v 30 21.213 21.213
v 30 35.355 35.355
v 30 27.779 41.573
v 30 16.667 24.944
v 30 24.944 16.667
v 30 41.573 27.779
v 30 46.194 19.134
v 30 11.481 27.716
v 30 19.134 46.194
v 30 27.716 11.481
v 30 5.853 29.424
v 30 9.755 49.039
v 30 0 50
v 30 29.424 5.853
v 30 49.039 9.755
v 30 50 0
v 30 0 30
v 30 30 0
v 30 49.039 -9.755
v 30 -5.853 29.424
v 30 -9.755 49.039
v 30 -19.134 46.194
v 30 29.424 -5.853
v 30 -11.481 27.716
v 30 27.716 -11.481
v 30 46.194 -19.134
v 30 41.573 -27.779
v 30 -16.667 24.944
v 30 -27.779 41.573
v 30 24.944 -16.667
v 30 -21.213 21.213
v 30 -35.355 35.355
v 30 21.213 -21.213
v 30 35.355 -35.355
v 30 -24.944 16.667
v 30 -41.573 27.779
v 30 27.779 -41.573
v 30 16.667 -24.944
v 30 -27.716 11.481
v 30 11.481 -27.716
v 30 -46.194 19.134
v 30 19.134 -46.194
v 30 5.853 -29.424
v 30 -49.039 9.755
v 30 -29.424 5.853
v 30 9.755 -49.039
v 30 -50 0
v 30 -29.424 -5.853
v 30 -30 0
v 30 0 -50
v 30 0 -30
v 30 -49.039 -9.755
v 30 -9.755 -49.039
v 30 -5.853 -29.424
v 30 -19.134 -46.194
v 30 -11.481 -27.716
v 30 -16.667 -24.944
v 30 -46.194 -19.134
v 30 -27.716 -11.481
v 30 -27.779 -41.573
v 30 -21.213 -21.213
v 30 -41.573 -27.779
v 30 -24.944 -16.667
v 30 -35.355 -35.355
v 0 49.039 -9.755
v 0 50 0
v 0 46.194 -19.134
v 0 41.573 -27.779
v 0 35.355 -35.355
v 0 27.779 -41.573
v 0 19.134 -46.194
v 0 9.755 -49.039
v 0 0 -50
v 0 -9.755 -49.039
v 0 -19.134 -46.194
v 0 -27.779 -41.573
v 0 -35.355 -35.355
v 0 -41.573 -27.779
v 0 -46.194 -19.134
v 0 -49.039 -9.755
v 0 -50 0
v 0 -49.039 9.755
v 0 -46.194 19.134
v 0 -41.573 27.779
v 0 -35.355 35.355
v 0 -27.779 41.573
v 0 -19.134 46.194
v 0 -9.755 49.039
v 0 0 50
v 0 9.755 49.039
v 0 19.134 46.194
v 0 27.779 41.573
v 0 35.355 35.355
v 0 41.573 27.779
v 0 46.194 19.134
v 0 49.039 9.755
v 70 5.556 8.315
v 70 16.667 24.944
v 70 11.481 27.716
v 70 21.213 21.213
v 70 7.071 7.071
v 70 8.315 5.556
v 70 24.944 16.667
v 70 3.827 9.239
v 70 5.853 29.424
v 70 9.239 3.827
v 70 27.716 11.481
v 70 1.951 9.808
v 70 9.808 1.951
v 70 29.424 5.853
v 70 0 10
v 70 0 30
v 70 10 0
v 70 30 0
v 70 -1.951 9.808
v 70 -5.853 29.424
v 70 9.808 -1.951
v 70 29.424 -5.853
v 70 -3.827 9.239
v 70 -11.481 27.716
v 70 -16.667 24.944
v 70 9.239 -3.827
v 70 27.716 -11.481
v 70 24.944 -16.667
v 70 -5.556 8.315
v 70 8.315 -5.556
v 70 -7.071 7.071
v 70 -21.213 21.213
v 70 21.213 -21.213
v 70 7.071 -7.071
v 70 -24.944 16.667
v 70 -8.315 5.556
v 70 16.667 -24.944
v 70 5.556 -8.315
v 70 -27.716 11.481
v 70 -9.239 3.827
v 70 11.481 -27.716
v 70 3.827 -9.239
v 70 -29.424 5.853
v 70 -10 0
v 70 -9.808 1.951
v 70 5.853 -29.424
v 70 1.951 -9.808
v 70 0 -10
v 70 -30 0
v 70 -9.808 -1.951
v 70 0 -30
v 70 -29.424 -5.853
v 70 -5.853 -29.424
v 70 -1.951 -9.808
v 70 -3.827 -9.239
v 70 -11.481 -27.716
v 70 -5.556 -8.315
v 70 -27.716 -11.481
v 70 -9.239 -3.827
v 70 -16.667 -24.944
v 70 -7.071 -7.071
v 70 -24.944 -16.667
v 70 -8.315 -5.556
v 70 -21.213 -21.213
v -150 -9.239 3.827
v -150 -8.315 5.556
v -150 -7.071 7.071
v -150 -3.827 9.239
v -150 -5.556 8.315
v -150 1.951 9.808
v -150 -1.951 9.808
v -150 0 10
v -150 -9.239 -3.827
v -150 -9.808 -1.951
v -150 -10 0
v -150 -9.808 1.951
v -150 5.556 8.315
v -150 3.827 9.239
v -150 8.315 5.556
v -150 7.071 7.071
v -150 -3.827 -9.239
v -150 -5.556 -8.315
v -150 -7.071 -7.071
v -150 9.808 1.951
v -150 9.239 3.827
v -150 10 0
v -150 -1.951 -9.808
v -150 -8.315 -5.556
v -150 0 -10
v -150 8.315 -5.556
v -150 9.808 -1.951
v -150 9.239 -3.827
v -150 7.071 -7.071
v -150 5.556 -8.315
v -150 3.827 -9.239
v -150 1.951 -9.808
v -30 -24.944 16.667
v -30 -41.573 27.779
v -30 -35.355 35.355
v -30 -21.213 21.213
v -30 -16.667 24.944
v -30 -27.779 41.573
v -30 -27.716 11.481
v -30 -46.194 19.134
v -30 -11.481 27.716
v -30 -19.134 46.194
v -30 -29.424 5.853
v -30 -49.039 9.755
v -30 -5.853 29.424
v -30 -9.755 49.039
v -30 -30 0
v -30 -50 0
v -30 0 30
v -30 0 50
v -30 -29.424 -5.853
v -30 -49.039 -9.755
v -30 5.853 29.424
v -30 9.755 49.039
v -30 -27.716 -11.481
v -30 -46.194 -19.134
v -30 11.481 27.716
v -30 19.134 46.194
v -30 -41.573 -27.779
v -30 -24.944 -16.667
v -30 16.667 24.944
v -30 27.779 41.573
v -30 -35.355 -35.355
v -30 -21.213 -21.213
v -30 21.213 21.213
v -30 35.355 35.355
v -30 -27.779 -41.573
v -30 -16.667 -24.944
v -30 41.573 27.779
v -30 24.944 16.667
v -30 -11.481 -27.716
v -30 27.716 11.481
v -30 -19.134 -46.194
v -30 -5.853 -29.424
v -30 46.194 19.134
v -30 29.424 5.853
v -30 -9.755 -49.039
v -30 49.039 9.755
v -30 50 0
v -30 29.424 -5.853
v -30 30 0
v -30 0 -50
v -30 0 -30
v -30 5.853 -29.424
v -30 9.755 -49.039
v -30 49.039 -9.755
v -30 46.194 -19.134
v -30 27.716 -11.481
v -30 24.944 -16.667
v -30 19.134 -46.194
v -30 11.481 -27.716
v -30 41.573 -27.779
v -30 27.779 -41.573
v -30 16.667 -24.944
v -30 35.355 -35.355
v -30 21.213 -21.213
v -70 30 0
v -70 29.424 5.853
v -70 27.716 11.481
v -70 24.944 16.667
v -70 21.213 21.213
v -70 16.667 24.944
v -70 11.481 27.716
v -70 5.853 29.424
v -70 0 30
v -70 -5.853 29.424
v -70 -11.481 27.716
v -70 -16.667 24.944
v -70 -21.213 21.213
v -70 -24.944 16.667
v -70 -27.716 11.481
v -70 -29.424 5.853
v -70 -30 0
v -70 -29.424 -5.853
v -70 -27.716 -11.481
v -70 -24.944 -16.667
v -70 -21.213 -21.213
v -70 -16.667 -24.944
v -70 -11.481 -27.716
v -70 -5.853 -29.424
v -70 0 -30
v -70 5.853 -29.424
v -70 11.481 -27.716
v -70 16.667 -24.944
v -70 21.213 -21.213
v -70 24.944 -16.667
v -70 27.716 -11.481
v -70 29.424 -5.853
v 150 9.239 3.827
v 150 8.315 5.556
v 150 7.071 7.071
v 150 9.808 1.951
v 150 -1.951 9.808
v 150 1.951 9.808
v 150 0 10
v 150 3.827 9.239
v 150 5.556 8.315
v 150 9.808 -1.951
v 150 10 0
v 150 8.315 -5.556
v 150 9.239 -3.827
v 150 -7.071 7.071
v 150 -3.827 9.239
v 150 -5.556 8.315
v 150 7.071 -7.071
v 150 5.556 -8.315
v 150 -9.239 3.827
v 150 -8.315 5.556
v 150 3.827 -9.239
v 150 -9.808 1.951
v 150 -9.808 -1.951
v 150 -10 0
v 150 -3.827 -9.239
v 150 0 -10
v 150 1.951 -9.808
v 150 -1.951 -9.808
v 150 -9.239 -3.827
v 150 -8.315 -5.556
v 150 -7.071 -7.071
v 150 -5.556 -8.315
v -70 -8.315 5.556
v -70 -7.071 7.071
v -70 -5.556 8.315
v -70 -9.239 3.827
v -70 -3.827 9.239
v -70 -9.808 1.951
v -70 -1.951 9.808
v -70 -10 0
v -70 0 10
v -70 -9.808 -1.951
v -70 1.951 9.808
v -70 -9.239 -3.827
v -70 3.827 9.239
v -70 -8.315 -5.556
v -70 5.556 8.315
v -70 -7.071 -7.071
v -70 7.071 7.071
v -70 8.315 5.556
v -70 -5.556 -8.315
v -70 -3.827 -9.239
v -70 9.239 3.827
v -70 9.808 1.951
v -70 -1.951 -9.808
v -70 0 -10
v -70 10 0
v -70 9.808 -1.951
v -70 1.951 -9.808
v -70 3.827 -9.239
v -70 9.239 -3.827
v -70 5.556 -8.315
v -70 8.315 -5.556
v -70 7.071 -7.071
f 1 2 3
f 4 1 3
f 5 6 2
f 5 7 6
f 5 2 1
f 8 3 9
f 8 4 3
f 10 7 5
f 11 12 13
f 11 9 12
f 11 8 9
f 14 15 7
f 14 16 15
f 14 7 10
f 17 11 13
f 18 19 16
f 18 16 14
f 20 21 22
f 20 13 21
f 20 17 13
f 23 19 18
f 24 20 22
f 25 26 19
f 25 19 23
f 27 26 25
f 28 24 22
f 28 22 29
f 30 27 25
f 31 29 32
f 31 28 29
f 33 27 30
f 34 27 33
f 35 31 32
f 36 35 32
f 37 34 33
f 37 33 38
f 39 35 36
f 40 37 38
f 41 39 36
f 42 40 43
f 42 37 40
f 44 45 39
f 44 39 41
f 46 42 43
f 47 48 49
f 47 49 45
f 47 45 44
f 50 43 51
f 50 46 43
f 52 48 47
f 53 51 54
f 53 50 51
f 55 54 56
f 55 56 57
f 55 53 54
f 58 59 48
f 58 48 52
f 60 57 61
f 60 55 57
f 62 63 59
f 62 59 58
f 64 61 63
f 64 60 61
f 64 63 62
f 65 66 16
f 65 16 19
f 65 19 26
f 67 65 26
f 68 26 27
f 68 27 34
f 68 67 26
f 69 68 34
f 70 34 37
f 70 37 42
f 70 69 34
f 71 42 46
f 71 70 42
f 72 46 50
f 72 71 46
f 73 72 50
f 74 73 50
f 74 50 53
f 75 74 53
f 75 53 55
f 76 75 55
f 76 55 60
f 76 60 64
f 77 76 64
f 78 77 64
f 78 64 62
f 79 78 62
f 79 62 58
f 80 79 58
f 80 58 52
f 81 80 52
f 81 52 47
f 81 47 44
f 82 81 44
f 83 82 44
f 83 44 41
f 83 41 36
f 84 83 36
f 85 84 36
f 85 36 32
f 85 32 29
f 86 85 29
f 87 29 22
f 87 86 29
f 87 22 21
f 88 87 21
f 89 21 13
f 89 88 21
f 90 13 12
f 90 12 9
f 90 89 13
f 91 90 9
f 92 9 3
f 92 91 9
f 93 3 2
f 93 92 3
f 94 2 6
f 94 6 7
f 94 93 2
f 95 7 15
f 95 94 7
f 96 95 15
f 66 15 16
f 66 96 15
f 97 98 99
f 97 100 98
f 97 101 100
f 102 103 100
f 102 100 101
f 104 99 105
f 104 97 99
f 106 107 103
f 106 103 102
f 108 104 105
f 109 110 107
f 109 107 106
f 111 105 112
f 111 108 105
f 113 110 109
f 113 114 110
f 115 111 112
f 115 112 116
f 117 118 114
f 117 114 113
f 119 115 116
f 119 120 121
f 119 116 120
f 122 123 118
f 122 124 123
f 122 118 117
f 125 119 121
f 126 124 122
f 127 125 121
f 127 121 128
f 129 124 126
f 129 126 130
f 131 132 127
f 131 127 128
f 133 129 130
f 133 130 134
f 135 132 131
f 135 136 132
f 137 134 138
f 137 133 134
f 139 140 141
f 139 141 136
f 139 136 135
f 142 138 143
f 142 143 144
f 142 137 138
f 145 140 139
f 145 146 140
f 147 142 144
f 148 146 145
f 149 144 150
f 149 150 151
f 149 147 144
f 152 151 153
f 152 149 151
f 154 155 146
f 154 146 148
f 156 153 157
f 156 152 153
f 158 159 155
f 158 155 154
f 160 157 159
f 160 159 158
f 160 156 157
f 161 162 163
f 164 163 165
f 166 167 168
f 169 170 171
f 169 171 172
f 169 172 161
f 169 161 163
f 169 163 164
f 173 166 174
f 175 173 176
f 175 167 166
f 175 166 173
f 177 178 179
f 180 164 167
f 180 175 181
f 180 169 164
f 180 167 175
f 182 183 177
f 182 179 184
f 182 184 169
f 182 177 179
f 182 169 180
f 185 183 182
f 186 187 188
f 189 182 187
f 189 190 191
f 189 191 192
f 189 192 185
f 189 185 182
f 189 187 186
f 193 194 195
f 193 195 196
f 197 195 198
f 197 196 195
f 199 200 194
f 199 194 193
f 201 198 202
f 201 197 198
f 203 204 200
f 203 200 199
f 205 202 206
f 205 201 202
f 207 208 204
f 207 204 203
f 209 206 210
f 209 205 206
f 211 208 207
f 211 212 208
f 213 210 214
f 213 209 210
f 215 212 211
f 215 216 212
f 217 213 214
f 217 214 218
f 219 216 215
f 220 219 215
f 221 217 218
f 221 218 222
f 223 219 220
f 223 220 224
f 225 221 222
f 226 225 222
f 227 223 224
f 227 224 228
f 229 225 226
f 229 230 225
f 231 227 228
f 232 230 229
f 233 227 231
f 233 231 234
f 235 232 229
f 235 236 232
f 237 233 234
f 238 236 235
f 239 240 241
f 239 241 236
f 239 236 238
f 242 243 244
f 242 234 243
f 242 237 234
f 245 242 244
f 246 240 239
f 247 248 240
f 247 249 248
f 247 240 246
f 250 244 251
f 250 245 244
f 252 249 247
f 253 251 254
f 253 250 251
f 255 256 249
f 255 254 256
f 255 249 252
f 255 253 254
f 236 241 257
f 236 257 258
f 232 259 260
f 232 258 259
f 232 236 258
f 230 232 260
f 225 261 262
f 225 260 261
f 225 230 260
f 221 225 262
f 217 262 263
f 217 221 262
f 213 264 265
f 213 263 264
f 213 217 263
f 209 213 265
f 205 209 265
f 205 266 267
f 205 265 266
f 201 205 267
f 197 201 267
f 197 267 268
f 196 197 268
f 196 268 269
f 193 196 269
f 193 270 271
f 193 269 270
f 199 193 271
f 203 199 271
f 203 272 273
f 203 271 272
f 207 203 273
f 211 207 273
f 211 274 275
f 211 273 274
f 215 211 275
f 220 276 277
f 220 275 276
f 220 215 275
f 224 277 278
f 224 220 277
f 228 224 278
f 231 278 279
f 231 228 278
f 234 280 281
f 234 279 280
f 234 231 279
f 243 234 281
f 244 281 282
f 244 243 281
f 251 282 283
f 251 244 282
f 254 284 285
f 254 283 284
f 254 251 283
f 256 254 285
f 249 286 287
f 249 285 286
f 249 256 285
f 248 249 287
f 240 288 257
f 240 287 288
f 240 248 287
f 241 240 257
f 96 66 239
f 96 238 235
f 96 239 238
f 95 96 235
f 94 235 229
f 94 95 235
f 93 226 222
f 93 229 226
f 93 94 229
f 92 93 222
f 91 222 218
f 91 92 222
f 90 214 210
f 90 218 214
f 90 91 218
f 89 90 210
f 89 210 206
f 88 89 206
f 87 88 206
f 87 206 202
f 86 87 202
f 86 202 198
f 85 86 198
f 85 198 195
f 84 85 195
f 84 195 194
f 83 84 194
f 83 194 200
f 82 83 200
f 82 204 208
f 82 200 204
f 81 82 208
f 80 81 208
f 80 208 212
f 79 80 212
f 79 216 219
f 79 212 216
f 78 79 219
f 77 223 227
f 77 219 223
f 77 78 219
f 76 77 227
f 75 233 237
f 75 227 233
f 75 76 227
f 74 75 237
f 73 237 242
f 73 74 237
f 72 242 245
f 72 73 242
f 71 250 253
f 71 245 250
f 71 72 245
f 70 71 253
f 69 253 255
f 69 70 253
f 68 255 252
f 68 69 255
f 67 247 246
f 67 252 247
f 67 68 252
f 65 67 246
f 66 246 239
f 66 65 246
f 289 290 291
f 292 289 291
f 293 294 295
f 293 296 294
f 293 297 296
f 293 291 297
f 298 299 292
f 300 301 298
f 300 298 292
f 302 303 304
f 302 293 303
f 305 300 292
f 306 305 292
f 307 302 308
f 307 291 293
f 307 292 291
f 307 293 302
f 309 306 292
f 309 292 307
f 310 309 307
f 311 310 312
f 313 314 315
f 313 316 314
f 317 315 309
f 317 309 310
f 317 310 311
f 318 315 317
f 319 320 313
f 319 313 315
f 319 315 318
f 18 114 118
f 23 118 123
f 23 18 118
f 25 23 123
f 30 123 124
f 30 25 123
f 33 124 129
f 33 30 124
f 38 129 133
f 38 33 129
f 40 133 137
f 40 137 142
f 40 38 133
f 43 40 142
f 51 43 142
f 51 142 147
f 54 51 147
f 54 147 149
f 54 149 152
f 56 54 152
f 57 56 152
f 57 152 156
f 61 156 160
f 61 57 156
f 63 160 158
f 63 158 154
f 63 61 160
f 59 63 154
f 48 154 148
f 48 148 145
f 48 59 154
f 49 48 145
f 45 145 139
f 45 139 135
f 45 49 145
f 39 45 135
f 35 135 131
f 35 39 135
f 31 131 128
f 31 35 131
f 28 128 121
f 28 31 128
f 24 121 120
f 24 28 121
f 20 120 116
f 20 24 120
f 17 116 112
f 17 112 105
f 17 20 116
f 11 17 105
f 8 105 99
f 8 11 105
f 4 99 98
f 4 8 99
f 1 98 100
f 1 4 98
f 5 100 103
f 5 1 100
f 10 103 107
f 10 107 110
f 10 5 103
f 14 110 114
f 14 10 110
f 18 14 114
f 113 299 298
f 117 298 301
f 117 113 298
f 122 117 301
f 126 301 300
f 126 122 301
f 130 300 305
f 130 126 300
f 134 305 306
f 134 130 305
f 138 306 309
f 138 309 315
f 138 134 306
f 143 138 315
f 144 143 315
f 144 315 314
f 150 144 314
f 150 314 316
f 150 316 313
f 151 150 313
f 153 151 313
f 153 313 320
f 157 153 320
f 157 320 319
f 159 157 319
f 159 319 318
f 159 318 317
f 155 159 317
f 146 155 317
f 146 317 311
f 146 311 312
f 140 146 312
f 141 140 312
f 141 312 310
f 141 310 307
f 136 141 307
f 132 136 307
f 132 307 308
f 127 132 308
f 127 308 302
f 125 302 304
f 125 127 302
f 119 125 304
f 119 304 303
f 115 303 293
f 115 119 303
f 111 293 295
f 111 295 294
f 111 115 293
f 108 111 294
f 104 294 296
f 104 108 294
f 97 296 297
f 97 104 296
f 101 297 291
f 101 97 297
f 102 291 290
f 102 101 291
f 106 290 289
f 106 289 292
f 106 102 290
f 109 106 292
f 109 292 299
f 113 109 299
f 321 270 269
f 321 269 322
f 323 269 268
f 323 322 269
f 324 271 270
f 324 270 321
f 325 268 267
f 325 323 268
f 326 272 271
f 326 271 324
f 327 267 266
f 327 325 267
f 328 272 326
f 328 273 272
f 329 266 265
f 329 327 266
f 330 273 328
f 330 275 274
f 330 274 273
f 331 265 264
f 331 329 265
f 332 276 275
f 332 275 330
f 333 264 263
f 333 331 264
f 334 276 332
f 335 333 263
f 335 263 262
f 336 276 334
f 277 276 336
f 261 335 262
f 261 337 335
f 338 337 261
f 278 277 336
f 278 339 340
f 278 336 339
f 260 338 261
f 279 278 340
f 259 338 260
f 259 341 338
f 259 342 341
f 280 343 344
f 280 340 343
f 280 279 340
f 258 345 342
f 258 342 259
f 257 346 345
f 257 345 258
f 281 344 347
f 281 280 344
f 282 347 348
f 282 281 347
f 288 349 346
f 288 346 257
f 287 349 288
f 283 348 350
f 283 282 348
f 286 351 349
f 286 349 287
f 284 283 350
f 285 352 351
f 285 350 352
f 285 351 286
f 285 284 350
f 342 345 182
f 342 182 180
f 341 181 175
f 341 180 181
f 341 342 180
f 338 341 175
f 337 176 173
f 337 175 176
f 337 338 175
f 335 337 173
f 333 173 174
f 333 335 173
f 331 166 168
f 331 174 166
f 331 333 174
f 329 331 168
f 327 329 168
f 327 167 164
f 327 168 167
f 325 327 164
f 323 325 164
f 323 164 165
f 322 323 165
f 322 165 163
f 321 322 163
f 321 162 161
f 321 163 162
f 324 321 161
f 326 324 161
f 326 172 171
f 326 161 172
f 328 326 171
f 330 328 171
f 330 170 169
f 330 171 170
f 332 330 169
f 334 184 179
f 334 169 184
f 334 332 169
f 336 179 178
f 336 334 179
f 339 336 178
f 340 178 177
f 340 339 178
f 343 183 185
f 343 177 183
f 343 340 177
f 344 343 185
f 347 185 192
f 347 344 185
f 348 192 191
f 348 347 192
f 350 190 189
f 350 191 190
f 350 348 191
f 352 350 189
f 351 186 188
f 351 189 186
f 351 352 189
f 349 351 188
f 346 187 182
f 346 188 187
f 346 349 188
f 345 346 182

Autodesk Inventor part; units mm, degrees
ref_plane "YZ Plane" through (0, 0, 0) normal (1, 0, 0) x (0, 1, 0)
ref_plane "XZ Plane" through (0, 0, 0) normal (0, 1, 0) x (-1, 0, 0)
ref_plane "XY Plane" through (0, 0, 0) normal (0, 0, 1) x (1, 0, 0)
sketch "草圖1" plane through (0, 0, 0) normal (0, 0, 1) x (1, 0, 0)
  line L0 (0, 0) -> (-30, 0)
  line L1 (-30, 0) -> (-30, 50)
  line L2 (-30, 50) -> (0, 50)
  line L3 (0, 50) -> (0, 0)
  line L4 (-30, 0) -> (-70, 0)
  line L5 (-70, 0) -> (-70, 30)
  line L6 (-70, 30) -> (-30, 30)
  line L7 (-30, 30) -> (-30, 0)
  line L8 (-70, 0) -> (-150, 0)
  line L9 (-150, 0) -> (-150, 10)
  line L10 (-150, 10) -> (-70, 10)
  line L11 (-70, 10) -> (-70, 0)
  dimension "d0" = 30
  dimension "d1" = 40
  dimension "d2" = 80
  dimension "d3" = 10
  dimension "d4" = 30
  dimension "d5" = 50
revolve "迴轉1" add sketch "草圖1" angle 360 about axis through (-70, 0, 0) along (-1, 0, 0)
mirror "鏡射1" about plane through (0, 0, 0) normal (1, 0, 0) of "迴轉1"
properties part number "P1"
